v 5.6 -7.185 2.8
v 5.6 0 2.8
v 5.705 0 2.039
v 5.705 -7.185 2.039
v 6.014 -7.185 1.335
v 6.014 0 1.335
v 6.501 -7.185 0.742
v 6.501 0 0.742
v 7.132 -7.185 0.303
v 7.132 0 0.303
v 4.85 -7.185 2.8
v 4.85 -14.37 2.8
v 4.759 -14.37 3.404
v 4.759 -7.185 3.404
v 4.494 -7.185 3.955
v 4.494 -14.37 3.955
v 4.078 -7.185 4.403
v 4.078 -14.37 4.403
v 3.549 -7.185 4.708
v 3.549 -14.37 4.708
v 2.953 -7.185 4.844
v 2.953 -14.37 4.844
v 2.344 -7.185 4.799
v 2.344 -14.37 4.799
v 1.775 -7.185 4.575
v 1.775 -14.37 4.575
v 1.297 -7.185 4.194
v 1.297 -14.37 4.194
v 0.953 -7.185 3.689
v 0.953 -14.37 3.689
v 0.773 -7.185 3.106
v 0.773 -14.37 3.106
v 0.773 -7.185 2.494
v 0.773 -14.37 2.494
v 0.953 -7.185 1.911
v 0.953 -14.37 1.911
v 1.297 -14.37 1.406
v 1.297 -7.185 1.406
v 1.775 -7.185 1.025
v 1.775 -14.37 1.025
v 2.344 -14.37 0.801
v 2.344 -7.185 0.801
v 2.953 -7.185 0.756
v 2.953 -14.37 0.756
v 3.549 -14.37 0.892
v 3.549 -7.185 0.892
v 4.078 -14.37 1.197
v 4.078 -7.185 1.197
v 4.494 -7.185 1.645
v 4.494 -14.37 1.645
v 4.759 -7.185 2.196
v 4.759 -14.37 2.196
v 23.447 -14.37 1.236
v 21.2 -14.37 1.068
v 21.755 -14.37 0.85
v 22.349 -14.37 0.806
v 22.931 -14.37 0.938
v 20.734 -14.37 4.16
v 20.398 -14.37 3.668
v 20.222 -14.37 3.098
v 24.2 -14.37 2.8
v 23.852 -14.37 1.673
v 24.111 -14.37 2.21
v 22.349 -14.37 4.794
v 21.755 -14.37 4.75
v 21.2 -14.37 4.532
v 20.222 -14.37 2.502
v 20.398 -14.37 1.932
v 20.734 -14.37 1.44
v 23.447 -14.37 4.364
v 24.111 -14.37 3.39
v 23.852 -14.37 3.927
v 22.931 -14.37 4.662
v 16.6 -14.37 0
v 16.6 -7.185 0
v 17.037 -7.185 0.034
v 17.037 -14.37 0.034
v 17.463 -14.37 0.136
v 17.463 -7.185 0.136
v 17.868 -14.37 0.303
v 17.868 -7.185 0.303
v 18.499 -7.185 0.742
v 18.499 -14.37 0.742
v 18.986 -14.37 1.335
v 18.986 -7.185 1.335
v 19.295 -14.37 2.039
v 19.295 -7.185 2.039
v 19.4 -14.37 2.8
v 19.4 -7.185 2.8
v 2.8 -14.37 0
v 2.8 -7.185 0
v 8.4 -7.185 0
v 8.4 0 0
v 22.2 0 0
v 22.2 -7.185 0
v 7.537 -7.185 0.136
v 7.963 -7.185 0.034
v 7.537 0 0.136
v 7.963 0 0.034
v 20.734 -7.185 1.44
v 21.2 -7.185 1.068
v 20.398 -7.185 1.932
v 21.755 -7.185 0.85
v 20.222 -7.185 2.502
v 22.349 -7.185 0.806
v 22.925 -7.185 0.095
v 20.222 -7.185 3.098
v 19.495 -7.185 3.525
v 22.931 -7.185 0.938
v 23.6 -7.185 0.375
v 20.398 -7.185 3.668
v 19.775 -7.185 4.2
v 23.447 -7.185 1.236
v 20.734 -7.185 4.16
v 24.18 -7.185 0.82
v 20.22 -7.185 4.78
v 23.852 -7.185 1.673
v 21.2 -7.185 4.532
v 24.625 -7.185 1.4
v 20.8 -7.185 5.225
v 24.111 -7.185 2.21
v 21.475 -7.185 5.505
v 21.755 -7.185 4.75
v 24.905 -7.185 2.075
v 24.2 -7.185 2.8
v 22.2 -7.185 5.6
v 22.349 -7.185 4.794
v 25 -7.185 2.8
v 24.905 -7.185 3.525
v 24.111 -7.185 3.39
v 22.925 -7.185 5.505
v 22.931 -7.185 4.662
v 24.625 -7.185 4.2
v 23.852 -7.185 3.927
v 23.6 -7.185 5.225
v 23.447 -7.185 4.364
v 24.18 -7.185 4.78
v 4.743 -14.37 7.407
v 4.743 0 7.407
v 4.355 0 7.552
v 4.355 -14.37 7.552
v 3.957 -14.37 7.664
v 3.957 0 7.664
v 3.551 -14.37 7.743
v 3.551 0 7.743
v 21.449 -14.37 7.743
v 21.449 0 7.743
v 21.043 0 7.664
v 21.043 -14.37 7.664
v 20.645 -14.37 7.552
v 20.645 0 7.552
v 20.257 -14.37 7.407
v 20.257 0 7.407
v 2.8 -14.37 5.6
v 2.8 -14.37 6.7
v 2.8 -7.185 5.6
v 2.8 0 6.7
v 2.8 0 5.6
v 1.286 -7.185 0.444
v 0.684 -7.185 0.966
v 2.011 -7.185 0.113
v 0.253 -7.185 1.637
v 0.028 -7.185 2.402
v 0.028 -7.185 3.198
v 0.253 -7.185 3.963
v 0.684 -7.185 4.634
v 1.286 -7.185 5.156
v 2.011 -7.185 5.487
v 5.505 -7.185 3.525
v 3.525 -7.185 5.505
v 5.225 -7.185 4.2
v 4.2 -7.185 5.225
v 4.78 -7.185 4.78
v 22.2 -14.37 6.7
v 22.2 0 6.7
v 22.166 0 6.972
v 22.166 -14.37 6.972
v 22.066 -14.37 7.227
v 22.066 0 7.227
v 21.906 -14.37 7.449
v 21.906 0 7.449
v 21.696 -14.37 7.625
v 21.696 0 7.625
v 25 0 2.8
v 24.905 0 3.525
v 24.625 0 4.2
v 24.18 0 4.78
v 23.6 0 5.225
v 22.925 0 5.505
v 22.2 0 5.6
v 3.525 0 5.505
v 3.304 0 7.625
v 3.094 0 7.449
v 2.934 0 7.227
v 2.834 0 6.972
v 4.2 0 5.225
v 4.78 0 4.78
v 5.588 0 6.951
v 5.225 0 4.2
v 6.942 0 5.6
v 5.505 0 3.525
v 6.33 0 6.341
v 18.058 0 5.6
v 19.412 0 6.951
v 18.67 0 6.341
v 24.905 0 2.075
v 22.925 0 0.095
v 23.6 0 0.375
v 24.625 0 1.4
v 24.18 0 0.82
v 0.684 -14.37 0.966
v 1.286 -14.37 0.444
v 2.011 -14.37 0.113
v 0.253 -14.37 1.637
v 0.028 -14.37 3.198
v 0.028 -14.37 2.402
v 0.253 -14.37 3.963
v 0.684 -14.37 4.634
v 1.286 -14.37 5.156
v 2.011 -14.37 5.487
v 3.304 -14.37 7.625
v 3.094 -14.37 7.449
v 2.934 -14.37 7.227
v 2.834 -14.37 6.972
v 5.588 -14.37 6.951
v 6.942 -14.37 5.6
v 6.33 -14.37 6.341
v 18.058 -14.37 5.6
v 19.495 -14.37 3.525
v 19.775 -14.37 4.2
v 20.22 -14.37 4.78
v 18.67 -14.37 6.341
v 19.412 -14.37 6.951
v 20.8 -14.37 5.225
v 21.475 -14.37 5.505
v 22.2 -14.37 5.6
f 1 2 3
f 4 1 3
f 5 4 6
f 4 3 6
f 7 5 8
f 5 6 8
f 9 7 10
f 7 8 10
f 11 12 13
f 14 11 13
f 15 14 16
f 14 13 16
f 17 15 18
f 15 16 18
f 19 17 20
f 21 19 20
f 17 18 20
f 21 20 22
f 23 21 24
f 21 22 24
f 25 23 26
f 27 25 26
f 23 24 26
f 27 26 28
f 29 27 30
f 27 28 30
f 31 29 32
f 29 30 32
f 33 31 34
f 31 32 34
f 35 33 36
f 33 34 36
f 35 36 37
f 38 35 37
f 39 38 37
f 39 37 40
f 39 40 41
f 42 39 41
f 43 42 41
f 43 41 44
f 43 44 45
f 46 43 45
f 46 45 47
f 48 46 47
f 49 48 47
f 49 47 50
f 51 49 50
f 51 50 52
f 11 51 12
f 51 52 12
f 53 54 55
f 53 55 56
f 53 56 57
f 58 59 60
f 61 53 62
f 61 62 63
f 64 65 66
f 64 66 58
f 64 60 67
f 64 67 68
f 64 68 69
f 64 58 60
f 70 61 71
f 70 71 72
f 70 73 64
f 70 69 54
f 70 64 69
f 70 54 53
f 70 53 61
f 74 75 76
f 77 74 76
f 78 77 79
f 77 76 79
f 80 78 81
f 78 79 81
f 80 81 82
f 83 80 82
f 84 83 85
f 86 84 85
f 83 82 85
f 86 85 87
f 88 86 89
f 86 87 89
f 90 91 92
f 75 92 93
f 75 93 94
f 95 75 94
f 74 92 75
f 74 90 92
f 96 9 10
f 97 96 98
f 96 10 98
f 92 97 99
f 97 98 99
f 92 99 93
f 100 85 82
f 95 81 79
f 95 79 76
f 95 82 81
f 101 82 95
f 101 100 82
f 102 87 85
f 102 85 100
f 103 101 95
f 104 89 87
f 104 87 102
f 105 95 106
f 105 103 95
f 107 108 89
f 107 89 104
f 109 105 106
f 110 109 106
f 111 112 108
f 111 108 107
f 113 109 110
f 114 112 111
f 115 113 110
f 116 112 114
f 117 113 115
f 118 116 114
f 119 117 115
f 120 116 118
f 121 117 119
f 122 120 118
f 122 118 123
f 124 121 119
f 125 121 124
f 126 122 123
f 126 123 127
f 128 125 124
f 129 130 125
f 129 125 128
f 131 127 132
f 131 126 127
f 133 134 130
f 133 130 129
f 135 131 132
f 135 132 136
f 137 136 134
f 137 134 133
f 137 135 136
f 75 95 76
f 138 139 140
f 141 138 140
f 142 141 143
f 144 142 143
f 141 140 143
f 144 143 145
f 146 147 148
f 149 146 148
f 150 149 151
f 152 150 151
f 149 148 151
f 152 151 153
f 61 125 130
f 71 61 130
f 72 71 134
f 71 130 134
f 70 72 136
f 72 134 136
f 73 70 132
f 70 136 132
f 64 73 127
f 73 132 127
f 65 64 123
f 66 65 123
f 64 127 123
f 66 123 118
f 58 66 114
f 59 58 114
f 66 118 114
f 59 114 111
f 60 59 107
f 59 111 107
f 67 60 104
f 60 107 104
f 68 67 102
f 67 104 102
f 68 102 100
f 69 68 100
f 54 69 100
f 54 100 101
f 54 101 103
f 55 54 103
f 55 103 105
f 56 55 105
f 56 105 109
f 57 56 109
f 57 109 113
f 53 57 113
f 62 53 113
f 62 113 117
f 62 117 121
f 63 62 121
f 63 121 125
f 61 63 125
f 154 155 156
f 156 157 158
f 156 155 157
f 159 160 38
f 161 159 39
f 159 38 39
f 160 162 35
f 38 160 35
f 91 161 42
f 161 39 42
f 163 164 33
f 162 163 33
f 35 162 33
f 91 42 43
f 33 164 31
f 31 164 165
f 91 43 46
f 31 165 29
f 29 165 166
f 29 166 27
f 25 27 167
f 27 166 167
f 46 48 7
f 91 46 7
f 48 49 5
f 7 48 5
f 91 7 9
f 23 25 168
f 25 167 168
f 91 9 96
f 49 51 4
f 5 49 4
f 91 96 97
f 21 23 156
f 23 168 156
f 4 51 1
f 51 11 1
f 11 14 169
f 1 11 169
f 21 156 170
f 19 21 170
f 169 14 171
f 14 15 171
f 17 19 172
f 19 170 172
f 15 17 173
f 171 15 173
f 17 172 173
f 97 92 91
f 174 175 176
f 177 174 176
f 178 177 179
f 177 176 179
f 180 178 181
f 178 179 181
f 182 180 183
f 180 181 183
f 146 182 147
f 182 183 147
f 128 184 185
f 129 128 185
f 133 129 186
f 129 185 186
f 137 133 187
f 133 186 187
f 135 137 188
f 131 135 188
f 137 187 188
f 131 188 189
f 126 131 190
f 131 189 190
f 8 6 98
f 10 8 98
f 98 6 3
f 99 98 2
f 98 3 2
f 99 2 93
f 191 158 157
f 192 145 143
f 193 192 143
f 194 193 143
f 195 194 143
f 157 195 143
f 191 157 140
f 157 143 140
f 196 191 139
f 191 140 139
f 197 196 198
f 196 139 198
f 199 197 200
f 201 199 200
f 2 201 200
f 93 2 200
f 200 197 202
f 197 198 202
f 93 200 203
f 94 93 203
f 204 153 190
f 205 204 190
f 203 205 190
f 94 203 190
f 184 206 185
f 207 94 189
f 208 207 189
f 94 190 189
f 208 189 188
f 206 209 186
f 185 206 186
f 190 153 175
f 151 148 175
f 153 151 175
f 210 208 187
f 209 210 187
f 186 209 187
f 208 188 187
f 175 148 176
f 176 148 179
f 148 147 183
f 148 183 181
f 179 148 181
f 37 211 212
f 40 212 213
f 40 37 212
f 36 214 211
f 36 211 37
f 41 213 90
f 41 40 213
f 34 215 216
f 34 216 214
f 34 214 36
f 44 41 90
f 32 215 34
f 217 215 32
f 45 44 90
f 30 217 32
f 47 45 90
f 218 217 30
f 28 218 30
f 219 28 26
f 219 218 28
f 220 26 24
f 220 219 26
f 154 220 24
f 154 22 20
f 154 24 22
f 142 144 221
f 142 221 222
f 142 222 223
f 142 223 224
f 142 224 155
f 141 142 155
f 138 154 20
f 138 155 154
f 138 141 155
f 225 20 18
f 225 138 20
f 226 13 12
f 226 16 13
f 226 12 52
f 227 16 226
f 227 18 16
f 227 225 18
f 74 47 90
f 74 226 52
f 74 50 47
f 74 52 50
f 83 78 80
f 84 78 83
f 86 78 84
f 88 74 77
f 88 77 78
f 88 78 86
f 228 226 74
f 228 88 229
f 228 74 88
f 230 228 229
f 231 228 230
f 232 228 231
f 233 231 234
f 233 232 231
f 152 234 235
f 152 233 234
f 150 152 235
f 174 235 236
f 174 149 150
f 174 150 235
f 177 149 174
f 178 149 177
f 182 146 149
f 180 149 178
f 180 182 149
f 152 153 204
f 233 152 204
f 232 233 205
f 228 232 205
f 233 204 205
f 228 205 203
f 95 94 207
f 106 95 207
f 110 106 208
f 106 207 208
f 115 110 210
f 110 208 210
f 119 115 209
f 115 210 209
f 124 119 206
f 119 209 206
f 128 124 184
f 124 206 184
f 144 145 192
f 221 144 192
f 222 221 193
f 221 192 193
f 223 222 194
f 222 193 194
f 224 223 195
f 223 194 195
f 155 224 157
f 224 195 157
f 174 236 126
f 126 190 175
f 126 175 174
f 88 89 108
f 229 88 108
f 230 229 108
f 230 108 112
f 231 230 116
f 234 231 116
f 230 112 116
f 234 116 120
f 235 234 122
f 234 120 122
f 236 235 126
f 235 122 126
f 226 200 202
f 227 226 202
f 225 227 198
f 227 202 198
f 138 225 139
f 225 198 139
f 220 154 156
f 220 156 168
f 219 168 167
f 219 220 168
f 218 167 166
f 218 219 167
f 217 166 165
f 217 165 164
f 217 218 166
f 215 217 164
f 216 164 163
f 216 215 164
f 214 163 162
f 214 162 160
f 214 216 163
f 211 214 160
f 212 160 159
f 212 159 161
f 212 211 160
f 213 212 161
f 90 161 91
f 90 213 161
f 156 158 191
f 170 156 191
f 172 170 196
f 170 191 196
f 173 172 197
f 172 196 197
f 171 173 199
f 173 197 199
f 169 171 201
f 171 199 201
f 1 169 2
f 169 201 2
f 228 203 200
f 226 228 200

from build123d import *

# Parameters (mm, degrees)
F1_DEPTH = 14.37
F0_R     = 2
F2_DEPTH = 7.185
F3_R     = 2.05
F4_DEPTH = 7.185


with BuildPart() as f1:
    # F0 (on Front) → F1 (new body)
    with BuildSketch(Plane.XZ):
        with BuildLine():
            ThreePointArc((7.1321428571, 0.3034947896), (7.7481620558, 0.0769305381), (8.4, 0))
            Line((8.4, 0), (16.6, 0))
            ThreePointArc((16.6, 0), (17.2518379442, 0.0769305381), (17.8678571429, 0.3034947896))
            ThreePointArc((17.8678571429, 0.3034947896), (18.9864199128, 1.3354181484), (19.4, 2.8))
            ThreePointArc((19.4, 2.8), (20.2201010127, 4.7798989873), (22.2, 5.6))
            Line((22.2, 5.6), (22.2, 6.7))
            ThreePointArc((22.2, 6.7), (21.8778174593, 5.9221825407), (21.1, 5.6))
            Line((21.1, 5.6), (18.0575369646, 5.6))
            Line((18.0575369646, 5.6), (6.9424630354, 5.6))
            Line((6.9424630354, 5.6), (3.9, 5.6))
            Line((3.9, 5.6), (2.8, 5.6))
            ThreePointArc((2.8, 5.6), (4.7798989873, 4.7798989873), (5.6, 2.8))
            ThreePointArc((5.6, 2.8), (6.0135800872, 1.3354181484), (7.1321428571, 0.3034947896))
        make_face()
        with BuildLine():
            ThreePointArc((20.2574998019, 7.4072435339), (19.0261653027, 6.6635182559), (18.0575369646, 5.6))
            Line((18.0575369646, 5.6), (21.1, 5.6))
            ThreePointArc((21.1, 5.6), (20.103012566, 6.2352247249), (20.2574998019, 7.4072435339))
        make_face()
        with BuildLine():
            ThreePointArc((20.2574998019, 7.4072435339), (20.103012566, 6.2352247249), (21.1, 5.6))
            ThreePointArc((21.1, 5.6), (21.8778174593, 5.9221825407), (22.2, 6.7))
            ThreePointArc((22.2, 6.7), (21.9926506427, 7.3427867688), (21.4487730361, 7.7432436768))
            ThreePointArc((21.4487730361, 7.7432436768), (20.8426991749, 7.6122483799), (20.2574998019, 7.4072435339))
        make_face()
        with BuildLine():
            ThreePointArc((4.7425001981, 7.4072435339), (4.896987434, 6.2352247249), (3.9, 5.6))
            Line((3.9, 5.6), (6.9424630354, 5.6))
            ThreePointArc((6.9424630354, 5.6), (5.9738346973, 6.6635182559), (4.7425001981, 7.4072435339))
        make_face()
        with BuildLine():
            ThreePointArc((2.8, 6.7), (3.1221825407, 5.9221825407), (3.9, 5.6))
            ThreePointArc((3.9, 5.6), (4.896987434, 6.2352247249), (4.7425001981, 7.4072435339))
            ThreePointArc((4.7425001981, 7.4072435339), (4.1573008251, 7.6122483799), (3.5512269639, 7.7432436768))
            ThreePointArc((3.5512269639, 7.7432436768), (3.0073493573, 7.3427867688), (2.8, 6.7))
        make_face()
        with BuildLine():
            Line((2.8, 6.7), (2.8, 5.6))
            Line((2.8, 5.6), (3.9, 5.6))
            ThreePointArc((3.9, 5.6), (3.1221825407, 5.9221825407), (2.8, 6.7))
        make_face()
    extrude(amount=F1_DEPTH)



with BuildPart() as f1b:
    # F0 (on Front) → F1, piece 2 (new body)
    with BuildSketch(Plane.XZ):
        with Locations((22.2, 2.8)):
            Circle(F0_R)
    extrude(amount=F1_DEPTH)


with BuildPart() as f1_1:
    add(f1.part)

    add(f1b.part)  # F2 merges F1b
    # F0 (on Front) → F2 (join)
    with BuildSketch(Plane.XZ):
        with BuildLine():
            ThreePointArc((17.8678571429, 0.3034947896), (17.2518379442, 0.0769305381), (16.6, 0))
            Line((16.6, 0), (22.2, 0))
            ThreePointArc((22.2, 0), (20.2201010127, 0.8201010127), (19.4, 2.8))
            ThreePointArc((19.4, 2.8), (18.9864199128, 1.3354181484), (17.8678571429, 0.3034947896))
        make_face()
        with BuildLine():
            ThreePointArc((19.4, 2.8), (20.2201010127, 0.8201010127), (22.2, 0))
            ThreePointArc((22.2, 0), (24.1798989873, 0.8201010127), (25, 2.8))
            ThreePointArc((25, 2.8), (24.1798989873, 4.7798989873), (22.2, 5.6))
            ThreePointArc((22.2, 5.6), (20.2201010127, 4.7798989873), (19.4, 2.8))
        make_face()
        with Locations((22.2, 2.8)):
            Circle(F0_R, mode=Mode.SUBTRACT)
    extrude(amount=F2_DEPTH)

    # F3 (on face) → F4 (join)
    with BuildSketch(Plane.XZ.offset(14.37)):
        with BuildLine():
            ThreePointArc((2.8, 0), (4.7798989873, 0.8201010127), (5.6, 2.8))
            ThreePointArc((5.6, 2.8), (4.7798989873, 4.7798989873), (2.8, 5.6))
            ThreePointArc((2.8, 5.6), (0, 2.8), (2.8, 0))
        make_face()
        with Locations((2.8, 2.8)):
            Circle(F3_R, mode=Mode.SUBTRACT)
        with BuildLine():
            ThreePointArc((8.4, 0), (6.4201010127, 0.8201010127), (5.6, 2.8))
            ThreePointArc((5.6, 2.8), (4.7798989873, 0.8201010127), (2.8, 0))
            Line((2.8, 0), (8.4, 0))
        make_face()
    extrude(amount=-F4_DEPTH)


solid = f1_1.part
